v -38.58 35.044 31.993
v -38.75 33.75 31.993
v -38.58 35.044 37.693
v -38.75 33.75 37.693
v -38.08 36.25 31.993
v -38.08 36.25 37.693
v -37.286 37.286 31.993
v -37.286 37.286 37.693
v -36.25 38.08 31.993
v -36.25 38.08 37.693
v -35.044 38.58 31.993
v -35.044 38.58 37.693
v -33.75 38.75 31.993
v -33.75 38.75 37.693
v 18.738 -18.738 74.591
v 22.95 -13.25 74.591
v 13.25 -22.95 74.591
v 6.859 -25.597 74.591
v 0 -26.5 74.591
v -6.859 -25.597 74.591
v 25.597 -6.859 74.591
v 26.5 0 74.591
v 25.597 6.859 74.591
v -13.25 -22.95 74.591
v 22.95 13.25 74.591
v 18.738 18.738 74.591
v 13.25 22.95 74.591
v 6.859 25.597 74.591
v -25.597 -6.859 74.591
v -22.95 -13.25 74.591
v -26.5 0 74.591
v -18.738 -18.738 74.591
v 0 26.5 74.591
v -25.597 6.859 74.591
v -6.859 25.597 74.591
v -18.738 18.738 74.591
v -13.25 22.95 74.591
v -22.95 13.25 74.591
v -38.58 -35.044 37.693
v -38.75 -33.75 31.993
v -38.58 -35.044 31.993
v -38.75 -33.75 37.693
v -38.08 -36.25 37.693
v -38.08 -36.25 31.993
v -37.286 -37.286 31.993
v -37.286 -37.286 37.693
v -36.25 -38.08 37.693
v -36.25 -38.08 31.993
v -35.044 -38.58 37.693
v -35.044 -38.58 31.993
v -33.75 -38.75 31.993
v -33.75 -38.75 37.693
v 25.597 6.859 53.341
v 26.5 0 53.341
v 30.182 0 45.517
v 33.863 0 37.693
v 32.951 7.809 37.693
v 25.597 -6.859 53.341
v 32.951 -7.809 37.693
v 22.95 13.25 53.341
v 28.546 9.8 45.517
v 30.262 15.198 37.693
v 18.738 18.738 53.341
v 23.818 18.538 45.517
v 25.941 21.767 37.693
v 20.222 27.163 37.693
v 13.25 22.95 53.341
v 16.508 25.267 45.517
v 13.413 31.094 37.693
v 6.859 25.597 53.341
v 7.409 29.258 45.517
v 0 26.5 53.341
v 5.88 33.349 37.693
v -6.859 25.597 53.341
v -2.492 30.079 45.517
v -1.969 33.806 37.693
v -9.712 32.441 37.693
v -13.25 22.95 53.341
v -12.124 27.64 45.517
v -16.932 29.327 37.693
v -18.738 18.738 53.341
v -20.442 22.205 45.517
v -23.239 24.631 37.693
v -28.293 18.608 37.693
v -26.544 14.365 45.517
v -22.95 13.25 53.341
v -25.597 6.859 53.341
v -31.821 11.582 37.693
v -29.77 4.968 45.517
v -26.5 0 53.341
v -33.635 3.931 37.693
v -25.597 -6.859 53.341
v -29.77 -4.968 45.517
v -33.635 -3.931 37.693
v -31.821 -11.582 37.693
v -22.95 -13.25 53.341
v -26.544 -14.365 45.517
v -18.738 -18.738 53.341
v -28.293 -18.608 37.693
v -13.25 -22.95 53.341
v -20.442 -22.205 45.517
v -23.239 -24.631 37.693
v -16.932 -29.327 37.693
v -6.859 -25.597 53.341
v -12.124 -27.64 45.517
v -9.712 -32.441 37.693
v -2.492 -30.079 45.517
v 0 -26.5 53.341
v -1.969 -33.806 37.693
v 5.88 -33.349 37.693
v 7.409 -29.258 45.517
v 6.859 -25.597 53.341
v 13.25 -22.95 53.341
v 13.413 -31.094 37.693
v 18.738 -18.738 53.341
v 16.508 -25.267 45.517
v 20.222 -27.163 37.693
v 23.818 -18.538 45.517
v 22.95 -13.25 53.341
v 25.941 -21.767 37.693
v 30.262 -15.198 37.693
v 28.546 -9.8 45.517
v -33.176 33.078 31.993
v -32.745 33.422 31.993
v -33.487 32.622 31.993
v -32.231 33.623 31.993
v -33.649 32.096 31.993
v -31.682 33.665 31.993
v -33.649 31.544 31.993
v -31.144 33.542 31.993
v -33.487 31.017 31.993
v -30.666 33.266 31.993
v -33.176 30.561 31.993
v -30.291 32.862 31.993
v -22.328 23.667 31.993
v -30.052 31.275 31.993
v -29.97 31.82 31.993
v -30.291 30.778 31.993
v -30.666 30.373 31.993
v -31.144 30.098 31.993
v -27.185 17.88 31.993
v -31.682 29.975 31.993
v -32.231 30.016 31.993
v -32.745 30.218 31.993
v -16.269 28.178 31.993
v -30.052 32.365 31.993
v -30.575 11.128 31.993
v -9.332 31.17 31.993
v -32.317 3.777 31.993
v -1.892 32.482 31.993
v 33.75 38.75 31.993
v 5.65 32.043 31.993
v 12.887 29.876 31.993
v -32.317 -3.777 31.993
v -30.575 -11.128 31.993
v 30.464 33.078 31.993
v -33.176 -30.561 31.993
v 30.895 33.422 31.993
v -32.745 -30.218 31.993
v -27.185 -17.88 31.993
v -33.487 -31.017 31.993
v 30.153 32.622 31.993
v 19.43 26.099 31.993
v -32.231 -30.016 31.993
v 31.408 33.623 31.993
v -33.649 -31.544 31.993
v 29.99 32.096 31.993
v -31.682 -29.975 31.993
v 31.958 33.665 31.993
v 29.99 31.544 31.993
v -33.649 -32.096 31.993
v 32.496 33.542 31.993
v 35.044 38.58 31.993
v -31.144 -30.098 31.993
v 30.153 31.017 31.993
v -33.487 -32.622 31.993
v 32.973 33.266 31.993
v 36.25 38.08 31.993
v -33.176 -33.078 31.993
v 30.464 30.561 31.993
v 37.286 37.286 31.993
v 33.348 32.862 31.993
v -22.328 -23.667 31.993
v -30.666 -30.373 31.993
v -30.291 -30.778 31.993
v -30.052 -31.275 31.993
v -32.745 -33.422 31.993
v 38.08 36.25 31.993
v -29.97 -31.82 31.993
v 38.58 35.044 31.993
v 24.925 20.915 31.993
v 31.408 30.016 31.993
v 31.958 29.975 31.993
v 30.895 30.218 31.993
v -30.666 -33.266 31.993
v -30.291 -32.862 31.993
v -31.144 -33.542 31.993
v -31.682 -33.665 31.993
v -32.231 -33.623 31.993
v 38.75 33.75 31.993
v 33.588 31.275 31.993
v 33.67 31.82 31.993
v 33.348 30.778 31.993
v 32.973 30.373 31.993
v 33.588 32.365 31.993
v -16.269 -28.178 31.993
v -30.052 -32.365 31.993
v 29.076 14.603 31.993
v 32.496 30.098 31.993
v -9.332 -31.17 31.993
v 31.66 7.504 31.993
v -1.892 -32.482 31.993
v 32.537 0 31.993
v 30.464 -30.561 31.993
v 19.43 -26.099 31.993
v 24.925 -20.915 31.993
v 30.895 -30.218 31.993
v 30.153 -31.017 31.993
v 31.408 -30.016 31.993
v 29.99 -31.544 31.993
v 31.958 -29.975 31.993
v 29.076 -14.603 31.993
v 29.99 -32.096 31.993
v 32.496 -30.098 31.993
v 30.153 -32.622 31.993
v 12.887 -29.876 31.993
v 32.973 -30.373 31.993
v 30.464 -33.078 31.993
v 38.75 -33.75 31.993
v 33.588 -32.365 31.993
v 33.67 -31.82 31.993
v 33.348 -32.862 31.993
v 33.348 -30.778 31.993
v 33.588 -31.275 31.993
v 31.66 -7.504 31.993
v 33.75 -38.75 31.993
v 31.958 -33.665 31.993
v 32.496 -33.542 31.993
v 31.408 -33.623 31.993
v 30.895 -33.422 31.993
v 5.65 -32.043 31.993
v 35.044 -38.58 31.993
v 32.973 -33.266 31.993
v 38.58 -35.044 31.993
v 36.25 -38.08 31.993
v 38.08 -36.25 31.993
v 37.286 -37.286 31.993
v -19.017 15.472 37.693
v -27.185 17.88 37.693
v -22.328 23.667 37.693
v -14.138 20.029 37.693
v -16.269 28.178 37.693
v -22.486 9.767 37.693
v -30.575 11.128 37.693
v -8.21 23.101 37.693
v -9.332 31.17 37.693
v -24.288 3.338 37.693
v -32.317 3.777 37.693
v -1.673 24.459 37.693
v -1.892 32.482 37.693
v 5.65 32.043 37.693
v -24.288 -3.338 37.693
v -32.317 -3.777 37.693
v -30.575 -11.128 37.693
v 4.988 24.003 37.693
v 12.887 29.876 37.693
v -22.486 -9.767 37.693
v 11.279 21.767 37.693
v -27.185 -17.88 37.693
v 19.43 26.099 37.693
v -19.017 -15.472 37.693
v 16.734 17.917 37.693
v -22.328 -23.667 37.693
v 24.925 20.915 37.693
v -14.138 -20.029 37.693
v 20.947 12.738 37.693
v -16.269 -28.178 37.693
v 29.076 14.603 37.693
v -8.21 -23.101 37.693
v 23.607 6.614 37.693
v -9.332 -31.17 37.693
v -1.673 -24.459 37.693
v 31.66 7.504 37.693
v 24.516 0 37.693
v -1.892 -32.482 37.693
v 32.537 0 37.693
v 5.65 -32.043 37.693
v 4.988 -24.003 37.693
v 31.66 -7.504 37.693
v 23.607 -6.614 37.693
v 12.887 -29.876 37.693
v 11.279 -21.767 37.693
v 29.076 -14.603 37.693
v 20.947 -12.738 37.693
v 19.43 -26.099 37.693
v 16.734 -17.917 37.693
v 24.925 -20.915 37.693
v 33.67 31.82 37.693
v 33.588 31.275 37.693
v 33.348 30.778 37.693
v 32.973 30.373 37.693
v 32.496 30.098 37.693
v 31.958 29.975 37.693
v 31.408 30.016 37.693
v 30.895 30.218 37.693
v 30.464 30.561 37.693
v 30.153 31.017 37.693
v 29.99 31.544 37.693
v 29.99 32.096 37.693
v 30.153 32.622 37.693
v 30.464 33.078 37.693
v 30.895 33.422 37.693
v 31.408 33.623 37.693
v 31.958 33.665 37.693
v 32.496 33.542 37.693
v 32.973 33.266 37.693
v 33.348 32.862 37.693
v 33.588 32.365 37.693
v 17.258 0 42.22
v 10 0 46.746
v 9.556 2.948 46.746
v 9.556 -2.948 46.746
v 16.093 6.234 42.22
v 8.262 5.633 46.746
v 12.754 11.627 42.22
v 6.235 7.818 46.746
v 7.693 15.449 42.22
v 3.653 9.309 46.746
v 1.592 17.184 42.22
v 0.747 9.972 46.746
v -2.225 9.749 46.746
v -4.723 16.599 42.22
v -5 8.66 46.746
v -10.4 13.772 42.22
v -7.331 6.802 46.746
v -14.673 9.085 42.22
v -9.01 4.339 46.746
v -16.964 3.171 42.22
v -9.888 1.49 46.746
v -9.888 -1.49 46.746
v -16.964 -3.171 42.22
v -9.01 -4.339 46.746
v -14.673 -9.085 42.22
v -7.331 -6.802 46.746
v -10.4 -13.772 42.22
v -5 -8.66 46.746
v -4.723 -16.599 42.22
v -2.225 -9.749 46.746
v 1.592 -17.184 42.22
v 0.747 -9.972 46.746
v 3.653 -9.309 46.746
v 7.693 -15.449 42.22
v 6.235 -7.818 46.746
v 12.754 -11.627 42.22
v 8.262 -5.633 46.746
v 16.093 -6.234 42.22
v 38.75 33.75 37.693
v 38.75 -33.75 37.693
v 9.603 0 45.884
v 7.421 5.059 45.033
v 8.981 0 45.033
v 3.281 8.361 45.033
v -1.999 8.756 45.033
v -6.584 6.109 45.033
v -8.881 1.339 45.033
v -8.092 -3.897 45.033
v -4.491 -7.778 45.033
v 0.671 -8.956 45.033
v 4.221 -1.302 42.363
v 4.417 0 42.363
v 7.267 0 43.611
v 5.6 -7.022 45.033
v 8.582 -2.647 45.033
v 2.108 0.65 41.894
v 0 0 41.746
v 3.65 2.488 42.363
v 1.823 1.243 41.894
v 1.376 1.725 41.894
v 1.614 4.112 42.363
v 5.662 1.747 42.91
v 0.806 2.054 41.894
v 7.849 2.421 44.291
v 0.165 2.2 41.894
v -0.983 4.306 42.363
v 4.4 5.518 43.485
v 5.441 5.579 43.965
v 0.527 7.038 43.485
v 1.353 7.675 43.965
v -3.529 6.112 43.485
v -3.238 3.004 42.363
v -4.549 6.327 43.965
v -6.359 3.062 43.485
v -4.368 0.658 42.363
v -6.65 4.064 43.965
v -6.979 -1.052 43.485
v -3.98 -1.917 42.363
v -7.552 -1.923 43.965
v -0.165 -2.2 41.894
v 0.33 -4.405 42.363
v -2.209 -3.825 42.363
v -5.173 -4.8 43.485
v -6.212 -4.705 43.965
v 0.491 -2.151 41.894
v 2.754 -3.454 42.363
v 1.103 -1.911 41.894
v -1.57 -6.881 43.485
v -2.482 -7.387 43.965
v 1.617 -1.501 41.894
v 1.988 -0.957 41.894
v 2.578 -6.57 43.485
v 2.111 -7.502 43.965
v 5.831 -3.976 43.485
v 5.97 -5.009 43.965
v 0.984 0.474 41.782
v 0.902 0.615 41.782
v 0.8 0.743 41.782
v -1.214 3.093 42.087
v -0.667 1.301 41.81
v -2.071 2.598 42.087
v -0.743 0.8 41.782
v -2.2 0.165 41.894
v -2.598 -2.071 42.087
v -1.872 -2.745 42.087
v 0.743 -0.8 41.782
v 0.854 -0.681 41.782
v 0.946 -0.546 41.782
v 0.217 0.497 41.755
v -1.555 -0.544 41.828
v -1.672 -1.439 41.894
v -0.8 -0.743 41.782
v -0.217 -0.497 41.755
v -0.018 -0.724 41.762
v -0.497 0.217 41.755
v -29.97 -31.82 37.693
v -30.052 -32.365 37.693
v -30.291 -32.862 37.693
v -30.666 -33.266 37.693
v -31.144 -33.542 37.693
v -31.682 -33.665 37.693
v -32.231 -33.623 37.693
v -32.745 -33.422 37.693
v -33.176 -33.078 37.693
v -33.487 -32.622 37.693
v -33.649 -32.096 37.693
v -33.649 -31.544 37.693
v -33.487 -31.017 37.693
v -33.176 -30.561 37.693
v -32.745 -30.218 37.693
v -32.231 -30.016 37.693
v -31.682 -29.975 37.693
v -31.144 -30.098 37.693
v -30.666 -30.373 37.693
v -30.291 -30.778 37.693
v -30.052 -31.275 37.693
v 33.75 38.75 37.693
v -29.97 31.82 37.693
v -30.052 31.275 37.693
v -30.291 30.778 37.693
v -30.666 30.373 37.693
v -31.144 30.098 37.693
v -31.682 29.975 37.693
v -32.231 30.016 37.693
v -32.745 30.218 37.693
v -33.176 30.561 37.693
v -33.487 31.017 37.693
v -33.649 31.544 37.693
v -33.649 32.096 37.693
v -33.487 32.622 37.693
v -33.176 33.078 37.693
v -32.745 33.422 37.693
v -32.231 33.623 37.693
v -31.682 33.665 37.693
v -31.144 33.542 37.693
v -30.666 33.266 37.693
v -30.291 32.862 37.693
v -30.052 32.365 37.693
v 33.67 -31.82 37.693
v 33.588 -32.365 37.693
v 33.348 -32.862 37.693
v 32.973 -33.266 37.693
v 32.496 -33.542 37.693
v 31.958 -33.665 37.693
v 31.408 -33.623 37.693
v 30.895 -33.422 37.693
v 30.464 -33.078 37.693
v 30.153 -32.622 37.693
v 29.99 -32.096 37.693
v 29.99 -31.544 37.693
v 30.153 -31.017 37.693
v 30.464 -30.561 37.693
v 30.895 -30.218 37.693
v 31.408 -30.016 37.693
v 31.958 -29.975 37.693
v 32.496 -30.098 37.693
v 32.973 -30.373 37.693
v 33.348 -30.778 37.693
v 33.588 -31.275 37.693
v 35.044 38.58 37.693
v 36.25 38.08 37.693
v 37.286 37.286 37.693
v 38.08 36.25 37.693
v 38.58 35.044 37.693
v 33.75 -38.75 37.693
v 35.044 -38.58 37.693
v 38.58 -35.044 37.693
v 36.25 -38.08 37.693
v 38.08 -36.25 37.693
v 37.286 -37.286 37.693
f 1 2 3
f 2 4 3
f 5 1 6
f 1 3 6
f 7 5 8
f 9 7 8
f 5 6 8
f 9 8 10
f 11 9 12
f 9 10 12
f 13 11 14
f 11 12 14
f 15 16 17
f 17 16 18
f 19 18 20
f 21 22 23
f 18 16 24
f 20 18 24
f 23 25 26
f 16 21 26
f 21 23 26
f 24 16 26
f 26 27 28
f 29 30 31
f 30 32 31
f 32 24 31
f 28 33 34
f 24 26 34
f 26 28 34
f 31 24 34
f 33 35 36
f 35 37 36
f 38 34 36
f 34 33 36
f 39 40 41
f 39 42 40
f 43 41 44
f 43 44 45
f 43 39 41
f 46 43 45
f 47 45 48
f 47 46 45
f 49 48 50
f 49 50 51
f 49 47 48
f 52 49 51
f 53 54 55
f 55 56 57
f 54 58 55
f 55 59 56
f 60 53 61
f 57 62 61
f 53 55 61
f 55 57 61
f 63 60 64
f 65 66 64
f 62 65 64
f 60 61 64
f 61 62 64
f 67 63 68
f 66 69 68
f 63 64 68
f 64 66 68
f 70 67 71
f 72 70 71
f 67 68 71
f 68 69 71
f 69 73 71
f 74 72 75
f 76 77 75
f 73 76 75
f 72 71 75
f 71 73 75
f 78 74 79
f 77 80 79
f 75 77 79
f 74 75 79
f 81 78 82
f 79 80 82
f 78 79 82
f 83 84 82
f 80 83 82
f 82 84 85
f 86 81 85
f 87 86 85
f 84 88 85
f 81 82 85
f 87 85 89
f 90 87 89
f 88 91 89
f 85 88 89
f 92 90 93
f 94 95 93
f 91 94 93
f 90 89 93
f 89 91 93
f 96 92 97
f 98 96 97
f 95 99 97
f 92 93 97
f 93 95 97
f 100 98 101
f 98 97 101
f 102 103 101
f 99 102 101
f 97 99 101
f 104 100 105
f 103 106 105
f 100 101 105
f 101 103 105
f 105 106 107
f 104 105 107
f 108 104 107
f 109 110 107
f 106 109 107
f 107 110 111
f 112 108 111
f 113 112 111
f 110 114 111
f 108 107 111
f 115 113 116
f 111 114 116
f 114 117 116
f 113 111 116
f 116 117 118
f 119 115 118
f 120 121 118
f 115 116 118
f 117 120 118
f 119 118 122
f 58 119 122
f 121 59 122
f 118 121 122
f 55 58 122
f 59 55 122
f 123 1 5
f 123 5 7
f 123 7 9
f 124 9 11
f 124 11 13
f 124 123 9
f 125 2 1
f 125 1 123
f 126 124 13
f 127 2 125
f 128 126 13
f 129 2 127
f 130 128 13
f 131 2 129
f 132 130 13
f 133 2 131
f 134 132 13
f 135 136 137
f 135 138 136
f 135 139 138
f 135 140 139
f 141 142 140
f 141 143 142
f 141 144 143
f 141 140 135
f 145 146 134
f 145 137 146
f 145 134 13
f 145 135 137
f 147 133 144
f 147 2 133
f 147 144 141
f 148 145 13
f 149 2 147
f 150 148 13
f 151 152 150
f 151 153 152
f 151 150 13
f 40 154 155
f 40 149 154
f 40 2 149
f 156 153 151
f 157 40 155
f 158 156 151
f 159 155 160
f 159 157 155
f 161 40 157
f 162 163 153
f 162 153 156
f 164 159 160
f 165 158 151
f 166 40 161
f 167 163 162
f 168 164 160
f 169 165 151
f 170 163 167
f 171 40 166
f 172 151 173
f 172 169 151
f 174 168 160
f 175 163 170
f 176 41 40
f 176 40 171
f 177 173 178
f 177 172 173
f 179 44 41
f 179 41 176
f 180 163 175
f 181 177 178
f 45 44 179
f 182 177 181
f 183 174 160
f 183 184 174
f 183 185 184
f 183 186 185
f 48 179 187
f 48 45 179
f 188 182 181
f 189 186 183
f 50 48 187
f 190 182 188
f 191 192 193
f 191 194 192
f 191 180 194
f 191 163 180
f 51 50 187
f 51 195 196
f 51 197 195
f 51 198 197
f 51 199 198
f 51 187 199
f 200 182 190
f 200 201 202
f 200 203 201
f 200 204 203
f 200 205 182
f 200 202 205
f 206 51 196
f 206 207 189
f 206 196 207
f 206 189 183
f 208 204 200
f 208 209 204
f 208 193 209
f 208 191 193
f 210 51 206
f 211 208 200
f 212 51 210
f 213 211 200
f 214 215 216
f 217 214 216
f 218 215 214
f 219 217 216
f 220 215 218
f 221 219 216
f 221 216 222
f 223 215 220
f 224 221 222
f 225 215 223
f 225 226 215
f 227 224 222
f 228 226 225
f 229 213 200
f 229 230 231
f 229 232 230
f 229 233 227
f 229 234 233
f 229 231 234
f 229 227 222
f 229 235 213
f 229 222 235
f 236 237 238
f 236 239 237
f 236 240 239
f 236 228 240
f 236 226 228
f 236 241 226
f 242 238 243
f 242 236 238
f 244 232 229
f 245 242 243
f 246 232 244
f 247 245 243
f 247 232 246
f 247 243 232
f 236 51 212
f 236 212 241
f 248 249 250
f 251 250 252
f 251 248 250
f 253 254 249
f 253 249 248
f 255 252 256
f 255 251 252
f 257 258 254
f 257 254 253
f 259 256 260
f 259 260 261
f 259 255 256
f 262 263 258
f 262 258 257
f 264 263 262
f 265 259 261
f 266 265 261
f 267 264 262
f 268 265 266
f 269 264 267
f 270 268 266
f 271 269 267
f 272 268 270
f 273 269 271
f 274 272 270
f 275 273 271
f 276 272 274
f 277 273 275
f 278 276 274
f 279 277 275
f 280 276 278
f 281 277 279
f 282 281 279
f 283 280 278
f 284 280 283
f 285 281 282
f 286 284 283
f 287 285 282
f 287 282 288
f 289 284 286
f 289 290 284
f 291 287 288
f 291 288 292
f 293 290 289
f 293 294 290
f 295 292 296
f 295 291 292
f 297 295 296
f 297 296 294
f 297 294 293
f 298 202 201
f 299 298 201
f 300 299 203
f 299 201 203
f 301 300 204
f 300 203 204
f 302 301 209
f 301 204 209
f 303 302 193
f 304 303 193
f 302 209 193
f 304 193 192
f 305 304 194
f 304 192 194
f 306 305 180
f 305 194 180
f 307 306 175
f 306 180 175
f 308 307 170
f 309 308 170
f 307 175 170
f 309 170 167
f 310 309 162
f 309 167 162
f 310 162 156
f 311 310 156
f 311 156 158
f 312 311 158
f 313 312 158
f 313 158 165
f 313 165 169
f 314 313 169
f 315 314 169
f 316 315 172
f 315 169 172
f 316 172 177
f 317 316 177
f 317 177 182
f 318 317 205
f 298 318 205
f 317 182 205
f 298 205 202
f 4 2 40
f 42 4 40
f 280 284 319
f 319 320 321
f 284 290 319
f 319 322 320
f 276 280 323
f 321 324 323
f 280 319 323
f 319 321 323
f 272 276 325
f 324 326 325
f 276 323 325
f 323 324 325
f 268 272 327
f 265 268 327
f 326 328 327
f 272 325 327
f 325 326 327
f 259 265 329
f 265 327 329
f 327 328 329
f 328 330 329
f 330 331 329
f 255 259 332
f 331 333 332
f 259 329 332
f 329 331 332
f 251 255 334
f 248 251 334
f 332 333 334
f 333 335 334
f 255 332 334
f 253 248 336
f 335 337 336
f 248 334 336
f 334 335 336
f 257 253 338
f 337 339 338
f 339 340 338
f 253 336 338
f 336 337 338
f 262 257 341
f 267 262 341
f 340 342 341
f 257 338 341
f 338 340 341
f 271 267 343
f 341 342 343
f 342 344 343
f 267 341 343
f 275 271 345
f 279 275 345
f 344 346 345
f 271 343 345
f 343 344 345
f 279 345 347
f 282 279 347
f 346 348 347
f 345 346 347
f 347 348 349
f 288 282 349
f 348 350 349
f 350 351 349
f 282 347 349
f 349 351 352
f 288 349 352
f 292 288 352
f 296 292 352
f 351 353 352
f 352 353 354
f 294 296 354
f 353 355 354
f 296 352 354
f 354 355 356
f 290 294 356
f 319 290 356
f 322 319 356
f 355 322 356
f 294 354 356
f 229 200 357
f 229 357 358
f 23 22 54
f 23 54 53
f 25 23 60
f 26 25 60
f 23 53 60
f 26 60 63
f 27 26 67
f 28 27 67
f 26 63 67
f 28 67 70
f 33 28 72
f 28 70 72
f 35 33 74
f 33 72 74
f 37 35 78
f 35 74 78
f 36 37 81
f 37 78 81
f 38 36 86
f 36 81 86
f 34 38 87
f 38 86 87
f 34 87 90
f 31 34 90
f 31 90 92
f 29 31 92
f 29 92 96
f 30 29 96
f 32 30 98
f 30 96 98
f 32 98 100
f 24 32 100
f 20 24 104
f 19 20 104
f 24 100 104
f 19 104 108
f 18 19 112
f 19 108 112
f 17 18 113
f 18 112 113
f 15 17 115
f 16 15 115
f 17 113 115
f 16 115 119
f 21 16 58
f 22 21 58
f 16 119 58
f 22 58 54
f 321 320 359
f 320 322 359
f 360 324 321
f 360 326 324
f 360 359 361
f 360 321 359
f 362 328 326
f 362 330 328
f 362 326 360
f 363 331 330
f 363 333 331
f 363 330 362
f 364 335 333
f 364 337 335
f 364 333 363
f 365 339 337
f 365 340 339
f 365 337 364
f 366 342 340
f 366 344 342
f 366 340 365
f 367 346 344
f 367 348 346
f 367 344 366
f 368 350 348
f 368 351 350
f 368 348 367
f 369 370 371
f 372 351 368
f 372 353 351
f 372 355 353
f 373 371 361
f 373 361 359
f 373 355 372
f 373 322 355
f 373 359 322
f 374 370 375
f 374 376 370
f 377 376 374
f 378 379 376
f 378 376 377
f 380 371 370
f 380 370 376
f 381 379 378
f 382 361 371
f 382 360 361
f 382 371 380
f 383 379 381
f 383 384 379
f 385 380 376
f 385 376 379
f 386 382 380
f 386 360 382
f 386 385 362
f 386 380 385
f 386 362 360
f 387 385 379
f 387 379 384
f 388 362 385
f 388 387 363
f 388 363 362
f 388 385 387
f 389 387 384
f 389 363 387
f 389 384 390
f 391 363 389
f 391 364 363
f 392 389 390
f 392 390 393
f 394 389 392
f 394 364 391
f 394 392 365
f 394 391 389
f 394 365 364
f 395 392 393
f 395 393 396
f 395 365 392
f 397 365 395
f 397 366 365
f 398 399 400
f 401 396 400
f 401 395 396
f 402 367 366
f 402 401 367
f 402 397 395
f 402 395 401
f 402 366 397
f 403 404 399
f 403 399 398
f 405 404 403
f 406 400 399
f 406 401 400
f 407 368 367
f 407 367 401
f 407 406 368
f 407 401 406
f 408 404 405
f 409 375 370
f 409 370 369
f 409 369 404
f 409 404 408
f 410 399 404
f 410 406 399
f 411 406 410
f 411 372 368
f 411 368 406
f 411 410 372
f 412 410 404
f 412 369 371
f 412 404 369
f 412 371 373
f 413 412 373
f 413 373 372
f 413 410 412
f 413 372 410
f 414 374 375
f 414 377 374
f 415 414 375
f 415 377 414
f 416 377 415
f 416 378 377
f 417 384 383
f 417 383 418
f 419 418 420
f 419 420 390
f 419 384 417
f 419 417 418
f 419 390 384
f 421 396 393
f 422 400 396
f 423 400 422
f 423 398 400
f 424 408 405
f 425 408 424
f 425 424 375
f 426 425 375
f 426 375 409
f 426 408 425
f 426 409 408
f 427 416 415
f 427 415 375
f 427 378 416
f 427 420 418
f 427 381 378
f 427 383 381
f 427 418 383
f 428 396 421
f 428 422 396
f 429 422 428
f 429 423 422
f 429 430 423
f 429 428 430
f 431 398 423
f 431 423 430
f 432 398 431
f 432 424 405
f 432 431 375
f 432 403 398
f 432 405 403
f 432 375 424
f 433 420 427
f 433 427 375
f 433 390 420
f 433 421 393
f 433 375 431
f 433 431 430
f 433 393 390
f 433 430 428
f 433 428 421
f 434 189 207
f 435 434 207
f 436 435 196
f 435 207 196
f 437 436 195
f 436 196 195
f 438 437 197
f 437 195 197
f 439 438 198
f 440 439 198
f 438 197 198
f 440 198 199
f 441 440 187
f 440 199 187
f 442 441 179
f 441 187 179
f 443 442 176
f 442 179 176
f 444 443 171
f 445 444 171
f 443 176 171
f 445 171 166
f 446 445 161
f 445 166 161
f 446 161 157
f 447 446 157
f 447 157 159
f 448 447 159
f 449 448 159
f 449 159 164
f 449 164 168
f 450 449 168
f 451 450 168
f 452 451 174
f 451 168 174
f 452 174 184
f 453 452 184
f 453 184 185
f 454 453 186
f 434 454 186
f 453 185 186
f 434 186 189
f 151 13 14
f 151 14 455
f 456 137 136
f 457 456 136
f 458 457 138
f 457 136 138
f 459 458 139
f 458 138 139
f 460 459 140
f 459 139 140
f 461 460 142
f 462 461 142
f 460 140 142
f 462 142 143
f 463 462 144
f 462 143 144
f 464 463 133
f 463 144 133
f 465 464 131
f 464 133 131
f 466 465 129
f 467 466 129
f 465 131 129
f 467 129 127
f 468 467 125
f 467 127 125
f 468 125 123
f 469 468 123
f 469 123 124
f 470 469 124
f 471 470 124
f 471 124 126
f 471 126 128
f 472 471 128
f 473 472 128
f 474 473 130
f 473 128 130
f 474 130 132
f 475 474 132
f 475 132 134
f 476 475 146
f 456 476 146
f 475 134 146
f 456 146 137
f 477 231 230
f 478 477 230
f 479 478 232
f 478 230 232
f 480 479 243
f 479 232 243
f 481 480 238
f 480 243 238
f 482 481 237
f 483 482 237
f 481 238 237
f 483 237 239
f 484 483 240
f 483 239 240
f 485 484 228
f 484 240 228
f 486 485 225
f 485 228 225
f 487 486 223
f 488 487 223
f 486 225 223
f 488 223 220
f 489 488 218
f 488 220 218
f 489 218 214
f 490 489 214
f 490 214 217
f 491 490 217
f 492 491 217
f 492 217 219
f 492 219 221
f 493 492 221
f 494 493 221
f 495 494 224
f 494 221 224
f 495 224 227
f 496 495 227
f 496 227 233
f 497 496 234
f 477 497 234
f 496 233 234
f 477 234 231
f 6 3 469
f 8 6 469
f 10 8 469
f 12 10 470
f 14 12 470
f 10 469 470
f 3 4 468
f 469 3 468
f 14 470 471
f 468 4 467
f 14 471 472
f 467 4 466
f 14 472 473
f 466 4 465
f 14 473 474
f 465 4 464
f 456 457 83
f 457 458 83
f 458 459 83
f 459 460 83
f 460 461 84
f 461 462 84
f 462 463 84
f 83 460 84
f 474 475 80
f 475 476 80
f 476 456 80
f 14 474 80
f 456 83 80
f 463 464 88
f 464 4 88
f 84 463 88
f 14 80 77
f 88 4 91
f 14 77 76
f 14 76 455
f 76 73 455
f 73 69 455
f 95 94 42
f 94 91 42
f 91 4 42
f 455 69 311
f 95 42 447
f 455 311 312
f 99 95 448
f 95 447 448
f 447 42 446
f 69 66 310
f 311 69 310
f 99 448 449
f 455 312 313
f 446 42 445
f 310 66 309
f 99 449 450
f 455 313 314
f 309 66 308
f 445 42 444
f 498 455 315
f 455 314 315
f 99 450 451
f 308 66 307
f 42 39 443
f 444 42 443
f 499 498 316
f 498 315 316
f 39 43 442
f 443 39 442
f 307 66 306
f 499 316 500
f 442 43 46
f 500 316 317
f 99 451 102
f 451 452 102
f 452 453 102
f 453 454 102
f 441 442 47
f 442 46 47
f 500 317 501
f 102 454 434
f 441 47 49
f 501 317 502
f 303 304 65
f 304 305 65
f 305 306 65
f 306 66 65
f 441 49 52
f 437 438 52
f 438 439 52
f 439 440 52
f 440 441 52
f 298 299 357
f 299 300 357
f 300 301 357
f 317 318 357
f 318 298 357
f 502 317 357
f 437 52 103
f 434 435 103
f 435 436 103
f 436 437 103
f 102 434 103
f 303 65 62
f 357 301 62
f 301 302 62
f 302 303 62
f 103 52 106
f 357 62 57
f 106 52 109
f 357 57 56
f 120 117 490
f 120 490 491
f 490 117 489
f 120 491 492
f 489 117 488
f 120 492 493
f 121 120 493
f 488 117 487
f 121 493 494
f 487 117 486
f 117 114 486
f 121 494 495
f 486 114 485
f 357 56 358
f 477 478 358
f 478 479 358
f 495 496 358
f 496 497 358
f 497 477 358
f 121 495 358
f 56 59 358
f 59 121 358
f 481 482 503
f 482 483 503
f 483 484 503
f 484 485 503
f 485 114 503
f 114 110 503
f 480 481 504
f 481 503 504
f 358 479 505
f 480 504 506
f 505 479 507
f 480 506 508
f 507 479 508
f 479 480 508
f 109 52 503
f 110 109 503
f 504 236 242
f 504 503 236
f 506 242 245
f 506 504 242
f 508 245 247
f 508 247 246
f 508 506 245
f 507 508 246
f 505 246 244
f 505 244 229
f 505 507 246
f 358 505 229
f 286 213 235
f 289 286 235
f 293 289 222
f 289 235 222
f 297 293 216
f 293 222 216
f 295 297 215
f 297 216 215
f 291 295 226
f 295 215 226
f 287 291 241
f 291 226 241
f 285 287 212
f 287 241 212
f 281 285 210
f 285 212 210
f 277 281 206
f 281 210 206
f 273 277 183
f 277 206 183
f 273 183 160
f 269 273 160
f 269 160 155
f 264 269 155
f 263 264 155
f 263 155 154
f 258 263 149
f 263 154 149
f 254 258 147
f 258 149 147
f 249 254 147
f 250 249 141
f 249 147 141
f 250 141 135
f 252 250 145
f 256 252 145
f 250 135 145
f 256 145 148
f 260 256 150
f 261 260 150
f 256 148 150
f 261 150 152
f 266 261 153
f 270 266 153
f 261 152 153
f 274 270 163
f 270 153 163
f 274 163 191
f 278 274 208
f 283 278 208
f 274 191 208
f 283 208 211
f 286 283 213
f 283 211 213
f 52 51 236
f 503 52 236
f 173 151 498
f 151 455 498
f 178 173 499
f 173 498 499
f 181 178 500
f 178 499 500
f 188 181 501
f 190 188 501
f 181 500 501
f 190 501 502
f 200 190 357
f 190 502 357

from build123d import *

# Parameters (mm, degrees)
SKETCH002_W  = 77.5
SKETCH002_H  = 77.5
SKETCH002_R  = 1.85
PAD_DEPTH    = 5.7
FILLET_R     = 5
SKETCH_R     = 32.537283
POCKET_DEPTH = 5.7


with BuildPart() as part:
    # Sketch001 → Revolution (revolve)
    with BuildSketch(Plane.XZ):
        with BuildLine():
            Line((0, 41.745886), (0, 74.590784))
            Line((0, 74.590784), (26.5, 74.590784))
            Line((26.5, 74.590784), (26.5, 53.340784))
            Line((26.5, 53.340784), (36.5, 32.090784))
            Line((36.5, 32.090784), (33.5, 32.090784))
            Line((33.5, 32.090784), (10, 46.745886))
            add(Edge.make_bspline(
                [(0, 41.745886), (8.313298, 41.745886), (10, 46.745886)],
                knots=[1.570796, 1.570796, 1.570796, 2.937282, 2.937282, 2.937282], degree=2, weights=[1, 0.77553, 1]))
        make_face()
    revolve(axis=Axis((0, 0, 0), (0, 0, 1)))

    # Sketch002 → Pad (new body)
    with BuildSketch(Plane(origin=(0, 0, 31.993353), x_dir=(1, 0, 0), z_dir=(0, 0, -1))):
        Rectangle(SKETCH002_W, SKETCH002_H)
        with Locations((-31.819805, 31.819805)):
            Circle(SKETCH002_R, mode=Mode.SUBTRACT)
        with Locations((31.819805, 31.819805)):
            Circle(SKETCH002_R, mode=Mode.SUBTRACT)
        with Locations((-31.819805, -31.819805)):
            Circle(SKETCH002_R, mode=Mode.SUBTRACT)
        with Locations((31.819805, -31.819805)):
            Circle(SKETCH002_R, mode=Mode.SUBTRACT)
    extrude(amount=-PAD_DEPTH)

    # Fillet
    fillet_edges = [part.edges().sort_by_distance(p)[0] for p in [
        (38.75, -38.75, 34.843353),
        (-38.75, -38.75, 34.843353),
        (-38.75, 38.75, 34.843353),
        (38.75, 38.75, 34.843353),
    ]]
    fillet(fillet_edges, radius=FILLET_R)

    # Sketch → Pocket (cut)
    with BuildSketch(Plane(origin=(0, 0, 31.993353), x_dir=(1, 0, 0), z_dir=(0, 0, -1))):
        Circle(SKETCH_R)
    extrude(amount=-POCKET_DEPTH, mode=Mode.SUBTRACT)


solid = part.part
